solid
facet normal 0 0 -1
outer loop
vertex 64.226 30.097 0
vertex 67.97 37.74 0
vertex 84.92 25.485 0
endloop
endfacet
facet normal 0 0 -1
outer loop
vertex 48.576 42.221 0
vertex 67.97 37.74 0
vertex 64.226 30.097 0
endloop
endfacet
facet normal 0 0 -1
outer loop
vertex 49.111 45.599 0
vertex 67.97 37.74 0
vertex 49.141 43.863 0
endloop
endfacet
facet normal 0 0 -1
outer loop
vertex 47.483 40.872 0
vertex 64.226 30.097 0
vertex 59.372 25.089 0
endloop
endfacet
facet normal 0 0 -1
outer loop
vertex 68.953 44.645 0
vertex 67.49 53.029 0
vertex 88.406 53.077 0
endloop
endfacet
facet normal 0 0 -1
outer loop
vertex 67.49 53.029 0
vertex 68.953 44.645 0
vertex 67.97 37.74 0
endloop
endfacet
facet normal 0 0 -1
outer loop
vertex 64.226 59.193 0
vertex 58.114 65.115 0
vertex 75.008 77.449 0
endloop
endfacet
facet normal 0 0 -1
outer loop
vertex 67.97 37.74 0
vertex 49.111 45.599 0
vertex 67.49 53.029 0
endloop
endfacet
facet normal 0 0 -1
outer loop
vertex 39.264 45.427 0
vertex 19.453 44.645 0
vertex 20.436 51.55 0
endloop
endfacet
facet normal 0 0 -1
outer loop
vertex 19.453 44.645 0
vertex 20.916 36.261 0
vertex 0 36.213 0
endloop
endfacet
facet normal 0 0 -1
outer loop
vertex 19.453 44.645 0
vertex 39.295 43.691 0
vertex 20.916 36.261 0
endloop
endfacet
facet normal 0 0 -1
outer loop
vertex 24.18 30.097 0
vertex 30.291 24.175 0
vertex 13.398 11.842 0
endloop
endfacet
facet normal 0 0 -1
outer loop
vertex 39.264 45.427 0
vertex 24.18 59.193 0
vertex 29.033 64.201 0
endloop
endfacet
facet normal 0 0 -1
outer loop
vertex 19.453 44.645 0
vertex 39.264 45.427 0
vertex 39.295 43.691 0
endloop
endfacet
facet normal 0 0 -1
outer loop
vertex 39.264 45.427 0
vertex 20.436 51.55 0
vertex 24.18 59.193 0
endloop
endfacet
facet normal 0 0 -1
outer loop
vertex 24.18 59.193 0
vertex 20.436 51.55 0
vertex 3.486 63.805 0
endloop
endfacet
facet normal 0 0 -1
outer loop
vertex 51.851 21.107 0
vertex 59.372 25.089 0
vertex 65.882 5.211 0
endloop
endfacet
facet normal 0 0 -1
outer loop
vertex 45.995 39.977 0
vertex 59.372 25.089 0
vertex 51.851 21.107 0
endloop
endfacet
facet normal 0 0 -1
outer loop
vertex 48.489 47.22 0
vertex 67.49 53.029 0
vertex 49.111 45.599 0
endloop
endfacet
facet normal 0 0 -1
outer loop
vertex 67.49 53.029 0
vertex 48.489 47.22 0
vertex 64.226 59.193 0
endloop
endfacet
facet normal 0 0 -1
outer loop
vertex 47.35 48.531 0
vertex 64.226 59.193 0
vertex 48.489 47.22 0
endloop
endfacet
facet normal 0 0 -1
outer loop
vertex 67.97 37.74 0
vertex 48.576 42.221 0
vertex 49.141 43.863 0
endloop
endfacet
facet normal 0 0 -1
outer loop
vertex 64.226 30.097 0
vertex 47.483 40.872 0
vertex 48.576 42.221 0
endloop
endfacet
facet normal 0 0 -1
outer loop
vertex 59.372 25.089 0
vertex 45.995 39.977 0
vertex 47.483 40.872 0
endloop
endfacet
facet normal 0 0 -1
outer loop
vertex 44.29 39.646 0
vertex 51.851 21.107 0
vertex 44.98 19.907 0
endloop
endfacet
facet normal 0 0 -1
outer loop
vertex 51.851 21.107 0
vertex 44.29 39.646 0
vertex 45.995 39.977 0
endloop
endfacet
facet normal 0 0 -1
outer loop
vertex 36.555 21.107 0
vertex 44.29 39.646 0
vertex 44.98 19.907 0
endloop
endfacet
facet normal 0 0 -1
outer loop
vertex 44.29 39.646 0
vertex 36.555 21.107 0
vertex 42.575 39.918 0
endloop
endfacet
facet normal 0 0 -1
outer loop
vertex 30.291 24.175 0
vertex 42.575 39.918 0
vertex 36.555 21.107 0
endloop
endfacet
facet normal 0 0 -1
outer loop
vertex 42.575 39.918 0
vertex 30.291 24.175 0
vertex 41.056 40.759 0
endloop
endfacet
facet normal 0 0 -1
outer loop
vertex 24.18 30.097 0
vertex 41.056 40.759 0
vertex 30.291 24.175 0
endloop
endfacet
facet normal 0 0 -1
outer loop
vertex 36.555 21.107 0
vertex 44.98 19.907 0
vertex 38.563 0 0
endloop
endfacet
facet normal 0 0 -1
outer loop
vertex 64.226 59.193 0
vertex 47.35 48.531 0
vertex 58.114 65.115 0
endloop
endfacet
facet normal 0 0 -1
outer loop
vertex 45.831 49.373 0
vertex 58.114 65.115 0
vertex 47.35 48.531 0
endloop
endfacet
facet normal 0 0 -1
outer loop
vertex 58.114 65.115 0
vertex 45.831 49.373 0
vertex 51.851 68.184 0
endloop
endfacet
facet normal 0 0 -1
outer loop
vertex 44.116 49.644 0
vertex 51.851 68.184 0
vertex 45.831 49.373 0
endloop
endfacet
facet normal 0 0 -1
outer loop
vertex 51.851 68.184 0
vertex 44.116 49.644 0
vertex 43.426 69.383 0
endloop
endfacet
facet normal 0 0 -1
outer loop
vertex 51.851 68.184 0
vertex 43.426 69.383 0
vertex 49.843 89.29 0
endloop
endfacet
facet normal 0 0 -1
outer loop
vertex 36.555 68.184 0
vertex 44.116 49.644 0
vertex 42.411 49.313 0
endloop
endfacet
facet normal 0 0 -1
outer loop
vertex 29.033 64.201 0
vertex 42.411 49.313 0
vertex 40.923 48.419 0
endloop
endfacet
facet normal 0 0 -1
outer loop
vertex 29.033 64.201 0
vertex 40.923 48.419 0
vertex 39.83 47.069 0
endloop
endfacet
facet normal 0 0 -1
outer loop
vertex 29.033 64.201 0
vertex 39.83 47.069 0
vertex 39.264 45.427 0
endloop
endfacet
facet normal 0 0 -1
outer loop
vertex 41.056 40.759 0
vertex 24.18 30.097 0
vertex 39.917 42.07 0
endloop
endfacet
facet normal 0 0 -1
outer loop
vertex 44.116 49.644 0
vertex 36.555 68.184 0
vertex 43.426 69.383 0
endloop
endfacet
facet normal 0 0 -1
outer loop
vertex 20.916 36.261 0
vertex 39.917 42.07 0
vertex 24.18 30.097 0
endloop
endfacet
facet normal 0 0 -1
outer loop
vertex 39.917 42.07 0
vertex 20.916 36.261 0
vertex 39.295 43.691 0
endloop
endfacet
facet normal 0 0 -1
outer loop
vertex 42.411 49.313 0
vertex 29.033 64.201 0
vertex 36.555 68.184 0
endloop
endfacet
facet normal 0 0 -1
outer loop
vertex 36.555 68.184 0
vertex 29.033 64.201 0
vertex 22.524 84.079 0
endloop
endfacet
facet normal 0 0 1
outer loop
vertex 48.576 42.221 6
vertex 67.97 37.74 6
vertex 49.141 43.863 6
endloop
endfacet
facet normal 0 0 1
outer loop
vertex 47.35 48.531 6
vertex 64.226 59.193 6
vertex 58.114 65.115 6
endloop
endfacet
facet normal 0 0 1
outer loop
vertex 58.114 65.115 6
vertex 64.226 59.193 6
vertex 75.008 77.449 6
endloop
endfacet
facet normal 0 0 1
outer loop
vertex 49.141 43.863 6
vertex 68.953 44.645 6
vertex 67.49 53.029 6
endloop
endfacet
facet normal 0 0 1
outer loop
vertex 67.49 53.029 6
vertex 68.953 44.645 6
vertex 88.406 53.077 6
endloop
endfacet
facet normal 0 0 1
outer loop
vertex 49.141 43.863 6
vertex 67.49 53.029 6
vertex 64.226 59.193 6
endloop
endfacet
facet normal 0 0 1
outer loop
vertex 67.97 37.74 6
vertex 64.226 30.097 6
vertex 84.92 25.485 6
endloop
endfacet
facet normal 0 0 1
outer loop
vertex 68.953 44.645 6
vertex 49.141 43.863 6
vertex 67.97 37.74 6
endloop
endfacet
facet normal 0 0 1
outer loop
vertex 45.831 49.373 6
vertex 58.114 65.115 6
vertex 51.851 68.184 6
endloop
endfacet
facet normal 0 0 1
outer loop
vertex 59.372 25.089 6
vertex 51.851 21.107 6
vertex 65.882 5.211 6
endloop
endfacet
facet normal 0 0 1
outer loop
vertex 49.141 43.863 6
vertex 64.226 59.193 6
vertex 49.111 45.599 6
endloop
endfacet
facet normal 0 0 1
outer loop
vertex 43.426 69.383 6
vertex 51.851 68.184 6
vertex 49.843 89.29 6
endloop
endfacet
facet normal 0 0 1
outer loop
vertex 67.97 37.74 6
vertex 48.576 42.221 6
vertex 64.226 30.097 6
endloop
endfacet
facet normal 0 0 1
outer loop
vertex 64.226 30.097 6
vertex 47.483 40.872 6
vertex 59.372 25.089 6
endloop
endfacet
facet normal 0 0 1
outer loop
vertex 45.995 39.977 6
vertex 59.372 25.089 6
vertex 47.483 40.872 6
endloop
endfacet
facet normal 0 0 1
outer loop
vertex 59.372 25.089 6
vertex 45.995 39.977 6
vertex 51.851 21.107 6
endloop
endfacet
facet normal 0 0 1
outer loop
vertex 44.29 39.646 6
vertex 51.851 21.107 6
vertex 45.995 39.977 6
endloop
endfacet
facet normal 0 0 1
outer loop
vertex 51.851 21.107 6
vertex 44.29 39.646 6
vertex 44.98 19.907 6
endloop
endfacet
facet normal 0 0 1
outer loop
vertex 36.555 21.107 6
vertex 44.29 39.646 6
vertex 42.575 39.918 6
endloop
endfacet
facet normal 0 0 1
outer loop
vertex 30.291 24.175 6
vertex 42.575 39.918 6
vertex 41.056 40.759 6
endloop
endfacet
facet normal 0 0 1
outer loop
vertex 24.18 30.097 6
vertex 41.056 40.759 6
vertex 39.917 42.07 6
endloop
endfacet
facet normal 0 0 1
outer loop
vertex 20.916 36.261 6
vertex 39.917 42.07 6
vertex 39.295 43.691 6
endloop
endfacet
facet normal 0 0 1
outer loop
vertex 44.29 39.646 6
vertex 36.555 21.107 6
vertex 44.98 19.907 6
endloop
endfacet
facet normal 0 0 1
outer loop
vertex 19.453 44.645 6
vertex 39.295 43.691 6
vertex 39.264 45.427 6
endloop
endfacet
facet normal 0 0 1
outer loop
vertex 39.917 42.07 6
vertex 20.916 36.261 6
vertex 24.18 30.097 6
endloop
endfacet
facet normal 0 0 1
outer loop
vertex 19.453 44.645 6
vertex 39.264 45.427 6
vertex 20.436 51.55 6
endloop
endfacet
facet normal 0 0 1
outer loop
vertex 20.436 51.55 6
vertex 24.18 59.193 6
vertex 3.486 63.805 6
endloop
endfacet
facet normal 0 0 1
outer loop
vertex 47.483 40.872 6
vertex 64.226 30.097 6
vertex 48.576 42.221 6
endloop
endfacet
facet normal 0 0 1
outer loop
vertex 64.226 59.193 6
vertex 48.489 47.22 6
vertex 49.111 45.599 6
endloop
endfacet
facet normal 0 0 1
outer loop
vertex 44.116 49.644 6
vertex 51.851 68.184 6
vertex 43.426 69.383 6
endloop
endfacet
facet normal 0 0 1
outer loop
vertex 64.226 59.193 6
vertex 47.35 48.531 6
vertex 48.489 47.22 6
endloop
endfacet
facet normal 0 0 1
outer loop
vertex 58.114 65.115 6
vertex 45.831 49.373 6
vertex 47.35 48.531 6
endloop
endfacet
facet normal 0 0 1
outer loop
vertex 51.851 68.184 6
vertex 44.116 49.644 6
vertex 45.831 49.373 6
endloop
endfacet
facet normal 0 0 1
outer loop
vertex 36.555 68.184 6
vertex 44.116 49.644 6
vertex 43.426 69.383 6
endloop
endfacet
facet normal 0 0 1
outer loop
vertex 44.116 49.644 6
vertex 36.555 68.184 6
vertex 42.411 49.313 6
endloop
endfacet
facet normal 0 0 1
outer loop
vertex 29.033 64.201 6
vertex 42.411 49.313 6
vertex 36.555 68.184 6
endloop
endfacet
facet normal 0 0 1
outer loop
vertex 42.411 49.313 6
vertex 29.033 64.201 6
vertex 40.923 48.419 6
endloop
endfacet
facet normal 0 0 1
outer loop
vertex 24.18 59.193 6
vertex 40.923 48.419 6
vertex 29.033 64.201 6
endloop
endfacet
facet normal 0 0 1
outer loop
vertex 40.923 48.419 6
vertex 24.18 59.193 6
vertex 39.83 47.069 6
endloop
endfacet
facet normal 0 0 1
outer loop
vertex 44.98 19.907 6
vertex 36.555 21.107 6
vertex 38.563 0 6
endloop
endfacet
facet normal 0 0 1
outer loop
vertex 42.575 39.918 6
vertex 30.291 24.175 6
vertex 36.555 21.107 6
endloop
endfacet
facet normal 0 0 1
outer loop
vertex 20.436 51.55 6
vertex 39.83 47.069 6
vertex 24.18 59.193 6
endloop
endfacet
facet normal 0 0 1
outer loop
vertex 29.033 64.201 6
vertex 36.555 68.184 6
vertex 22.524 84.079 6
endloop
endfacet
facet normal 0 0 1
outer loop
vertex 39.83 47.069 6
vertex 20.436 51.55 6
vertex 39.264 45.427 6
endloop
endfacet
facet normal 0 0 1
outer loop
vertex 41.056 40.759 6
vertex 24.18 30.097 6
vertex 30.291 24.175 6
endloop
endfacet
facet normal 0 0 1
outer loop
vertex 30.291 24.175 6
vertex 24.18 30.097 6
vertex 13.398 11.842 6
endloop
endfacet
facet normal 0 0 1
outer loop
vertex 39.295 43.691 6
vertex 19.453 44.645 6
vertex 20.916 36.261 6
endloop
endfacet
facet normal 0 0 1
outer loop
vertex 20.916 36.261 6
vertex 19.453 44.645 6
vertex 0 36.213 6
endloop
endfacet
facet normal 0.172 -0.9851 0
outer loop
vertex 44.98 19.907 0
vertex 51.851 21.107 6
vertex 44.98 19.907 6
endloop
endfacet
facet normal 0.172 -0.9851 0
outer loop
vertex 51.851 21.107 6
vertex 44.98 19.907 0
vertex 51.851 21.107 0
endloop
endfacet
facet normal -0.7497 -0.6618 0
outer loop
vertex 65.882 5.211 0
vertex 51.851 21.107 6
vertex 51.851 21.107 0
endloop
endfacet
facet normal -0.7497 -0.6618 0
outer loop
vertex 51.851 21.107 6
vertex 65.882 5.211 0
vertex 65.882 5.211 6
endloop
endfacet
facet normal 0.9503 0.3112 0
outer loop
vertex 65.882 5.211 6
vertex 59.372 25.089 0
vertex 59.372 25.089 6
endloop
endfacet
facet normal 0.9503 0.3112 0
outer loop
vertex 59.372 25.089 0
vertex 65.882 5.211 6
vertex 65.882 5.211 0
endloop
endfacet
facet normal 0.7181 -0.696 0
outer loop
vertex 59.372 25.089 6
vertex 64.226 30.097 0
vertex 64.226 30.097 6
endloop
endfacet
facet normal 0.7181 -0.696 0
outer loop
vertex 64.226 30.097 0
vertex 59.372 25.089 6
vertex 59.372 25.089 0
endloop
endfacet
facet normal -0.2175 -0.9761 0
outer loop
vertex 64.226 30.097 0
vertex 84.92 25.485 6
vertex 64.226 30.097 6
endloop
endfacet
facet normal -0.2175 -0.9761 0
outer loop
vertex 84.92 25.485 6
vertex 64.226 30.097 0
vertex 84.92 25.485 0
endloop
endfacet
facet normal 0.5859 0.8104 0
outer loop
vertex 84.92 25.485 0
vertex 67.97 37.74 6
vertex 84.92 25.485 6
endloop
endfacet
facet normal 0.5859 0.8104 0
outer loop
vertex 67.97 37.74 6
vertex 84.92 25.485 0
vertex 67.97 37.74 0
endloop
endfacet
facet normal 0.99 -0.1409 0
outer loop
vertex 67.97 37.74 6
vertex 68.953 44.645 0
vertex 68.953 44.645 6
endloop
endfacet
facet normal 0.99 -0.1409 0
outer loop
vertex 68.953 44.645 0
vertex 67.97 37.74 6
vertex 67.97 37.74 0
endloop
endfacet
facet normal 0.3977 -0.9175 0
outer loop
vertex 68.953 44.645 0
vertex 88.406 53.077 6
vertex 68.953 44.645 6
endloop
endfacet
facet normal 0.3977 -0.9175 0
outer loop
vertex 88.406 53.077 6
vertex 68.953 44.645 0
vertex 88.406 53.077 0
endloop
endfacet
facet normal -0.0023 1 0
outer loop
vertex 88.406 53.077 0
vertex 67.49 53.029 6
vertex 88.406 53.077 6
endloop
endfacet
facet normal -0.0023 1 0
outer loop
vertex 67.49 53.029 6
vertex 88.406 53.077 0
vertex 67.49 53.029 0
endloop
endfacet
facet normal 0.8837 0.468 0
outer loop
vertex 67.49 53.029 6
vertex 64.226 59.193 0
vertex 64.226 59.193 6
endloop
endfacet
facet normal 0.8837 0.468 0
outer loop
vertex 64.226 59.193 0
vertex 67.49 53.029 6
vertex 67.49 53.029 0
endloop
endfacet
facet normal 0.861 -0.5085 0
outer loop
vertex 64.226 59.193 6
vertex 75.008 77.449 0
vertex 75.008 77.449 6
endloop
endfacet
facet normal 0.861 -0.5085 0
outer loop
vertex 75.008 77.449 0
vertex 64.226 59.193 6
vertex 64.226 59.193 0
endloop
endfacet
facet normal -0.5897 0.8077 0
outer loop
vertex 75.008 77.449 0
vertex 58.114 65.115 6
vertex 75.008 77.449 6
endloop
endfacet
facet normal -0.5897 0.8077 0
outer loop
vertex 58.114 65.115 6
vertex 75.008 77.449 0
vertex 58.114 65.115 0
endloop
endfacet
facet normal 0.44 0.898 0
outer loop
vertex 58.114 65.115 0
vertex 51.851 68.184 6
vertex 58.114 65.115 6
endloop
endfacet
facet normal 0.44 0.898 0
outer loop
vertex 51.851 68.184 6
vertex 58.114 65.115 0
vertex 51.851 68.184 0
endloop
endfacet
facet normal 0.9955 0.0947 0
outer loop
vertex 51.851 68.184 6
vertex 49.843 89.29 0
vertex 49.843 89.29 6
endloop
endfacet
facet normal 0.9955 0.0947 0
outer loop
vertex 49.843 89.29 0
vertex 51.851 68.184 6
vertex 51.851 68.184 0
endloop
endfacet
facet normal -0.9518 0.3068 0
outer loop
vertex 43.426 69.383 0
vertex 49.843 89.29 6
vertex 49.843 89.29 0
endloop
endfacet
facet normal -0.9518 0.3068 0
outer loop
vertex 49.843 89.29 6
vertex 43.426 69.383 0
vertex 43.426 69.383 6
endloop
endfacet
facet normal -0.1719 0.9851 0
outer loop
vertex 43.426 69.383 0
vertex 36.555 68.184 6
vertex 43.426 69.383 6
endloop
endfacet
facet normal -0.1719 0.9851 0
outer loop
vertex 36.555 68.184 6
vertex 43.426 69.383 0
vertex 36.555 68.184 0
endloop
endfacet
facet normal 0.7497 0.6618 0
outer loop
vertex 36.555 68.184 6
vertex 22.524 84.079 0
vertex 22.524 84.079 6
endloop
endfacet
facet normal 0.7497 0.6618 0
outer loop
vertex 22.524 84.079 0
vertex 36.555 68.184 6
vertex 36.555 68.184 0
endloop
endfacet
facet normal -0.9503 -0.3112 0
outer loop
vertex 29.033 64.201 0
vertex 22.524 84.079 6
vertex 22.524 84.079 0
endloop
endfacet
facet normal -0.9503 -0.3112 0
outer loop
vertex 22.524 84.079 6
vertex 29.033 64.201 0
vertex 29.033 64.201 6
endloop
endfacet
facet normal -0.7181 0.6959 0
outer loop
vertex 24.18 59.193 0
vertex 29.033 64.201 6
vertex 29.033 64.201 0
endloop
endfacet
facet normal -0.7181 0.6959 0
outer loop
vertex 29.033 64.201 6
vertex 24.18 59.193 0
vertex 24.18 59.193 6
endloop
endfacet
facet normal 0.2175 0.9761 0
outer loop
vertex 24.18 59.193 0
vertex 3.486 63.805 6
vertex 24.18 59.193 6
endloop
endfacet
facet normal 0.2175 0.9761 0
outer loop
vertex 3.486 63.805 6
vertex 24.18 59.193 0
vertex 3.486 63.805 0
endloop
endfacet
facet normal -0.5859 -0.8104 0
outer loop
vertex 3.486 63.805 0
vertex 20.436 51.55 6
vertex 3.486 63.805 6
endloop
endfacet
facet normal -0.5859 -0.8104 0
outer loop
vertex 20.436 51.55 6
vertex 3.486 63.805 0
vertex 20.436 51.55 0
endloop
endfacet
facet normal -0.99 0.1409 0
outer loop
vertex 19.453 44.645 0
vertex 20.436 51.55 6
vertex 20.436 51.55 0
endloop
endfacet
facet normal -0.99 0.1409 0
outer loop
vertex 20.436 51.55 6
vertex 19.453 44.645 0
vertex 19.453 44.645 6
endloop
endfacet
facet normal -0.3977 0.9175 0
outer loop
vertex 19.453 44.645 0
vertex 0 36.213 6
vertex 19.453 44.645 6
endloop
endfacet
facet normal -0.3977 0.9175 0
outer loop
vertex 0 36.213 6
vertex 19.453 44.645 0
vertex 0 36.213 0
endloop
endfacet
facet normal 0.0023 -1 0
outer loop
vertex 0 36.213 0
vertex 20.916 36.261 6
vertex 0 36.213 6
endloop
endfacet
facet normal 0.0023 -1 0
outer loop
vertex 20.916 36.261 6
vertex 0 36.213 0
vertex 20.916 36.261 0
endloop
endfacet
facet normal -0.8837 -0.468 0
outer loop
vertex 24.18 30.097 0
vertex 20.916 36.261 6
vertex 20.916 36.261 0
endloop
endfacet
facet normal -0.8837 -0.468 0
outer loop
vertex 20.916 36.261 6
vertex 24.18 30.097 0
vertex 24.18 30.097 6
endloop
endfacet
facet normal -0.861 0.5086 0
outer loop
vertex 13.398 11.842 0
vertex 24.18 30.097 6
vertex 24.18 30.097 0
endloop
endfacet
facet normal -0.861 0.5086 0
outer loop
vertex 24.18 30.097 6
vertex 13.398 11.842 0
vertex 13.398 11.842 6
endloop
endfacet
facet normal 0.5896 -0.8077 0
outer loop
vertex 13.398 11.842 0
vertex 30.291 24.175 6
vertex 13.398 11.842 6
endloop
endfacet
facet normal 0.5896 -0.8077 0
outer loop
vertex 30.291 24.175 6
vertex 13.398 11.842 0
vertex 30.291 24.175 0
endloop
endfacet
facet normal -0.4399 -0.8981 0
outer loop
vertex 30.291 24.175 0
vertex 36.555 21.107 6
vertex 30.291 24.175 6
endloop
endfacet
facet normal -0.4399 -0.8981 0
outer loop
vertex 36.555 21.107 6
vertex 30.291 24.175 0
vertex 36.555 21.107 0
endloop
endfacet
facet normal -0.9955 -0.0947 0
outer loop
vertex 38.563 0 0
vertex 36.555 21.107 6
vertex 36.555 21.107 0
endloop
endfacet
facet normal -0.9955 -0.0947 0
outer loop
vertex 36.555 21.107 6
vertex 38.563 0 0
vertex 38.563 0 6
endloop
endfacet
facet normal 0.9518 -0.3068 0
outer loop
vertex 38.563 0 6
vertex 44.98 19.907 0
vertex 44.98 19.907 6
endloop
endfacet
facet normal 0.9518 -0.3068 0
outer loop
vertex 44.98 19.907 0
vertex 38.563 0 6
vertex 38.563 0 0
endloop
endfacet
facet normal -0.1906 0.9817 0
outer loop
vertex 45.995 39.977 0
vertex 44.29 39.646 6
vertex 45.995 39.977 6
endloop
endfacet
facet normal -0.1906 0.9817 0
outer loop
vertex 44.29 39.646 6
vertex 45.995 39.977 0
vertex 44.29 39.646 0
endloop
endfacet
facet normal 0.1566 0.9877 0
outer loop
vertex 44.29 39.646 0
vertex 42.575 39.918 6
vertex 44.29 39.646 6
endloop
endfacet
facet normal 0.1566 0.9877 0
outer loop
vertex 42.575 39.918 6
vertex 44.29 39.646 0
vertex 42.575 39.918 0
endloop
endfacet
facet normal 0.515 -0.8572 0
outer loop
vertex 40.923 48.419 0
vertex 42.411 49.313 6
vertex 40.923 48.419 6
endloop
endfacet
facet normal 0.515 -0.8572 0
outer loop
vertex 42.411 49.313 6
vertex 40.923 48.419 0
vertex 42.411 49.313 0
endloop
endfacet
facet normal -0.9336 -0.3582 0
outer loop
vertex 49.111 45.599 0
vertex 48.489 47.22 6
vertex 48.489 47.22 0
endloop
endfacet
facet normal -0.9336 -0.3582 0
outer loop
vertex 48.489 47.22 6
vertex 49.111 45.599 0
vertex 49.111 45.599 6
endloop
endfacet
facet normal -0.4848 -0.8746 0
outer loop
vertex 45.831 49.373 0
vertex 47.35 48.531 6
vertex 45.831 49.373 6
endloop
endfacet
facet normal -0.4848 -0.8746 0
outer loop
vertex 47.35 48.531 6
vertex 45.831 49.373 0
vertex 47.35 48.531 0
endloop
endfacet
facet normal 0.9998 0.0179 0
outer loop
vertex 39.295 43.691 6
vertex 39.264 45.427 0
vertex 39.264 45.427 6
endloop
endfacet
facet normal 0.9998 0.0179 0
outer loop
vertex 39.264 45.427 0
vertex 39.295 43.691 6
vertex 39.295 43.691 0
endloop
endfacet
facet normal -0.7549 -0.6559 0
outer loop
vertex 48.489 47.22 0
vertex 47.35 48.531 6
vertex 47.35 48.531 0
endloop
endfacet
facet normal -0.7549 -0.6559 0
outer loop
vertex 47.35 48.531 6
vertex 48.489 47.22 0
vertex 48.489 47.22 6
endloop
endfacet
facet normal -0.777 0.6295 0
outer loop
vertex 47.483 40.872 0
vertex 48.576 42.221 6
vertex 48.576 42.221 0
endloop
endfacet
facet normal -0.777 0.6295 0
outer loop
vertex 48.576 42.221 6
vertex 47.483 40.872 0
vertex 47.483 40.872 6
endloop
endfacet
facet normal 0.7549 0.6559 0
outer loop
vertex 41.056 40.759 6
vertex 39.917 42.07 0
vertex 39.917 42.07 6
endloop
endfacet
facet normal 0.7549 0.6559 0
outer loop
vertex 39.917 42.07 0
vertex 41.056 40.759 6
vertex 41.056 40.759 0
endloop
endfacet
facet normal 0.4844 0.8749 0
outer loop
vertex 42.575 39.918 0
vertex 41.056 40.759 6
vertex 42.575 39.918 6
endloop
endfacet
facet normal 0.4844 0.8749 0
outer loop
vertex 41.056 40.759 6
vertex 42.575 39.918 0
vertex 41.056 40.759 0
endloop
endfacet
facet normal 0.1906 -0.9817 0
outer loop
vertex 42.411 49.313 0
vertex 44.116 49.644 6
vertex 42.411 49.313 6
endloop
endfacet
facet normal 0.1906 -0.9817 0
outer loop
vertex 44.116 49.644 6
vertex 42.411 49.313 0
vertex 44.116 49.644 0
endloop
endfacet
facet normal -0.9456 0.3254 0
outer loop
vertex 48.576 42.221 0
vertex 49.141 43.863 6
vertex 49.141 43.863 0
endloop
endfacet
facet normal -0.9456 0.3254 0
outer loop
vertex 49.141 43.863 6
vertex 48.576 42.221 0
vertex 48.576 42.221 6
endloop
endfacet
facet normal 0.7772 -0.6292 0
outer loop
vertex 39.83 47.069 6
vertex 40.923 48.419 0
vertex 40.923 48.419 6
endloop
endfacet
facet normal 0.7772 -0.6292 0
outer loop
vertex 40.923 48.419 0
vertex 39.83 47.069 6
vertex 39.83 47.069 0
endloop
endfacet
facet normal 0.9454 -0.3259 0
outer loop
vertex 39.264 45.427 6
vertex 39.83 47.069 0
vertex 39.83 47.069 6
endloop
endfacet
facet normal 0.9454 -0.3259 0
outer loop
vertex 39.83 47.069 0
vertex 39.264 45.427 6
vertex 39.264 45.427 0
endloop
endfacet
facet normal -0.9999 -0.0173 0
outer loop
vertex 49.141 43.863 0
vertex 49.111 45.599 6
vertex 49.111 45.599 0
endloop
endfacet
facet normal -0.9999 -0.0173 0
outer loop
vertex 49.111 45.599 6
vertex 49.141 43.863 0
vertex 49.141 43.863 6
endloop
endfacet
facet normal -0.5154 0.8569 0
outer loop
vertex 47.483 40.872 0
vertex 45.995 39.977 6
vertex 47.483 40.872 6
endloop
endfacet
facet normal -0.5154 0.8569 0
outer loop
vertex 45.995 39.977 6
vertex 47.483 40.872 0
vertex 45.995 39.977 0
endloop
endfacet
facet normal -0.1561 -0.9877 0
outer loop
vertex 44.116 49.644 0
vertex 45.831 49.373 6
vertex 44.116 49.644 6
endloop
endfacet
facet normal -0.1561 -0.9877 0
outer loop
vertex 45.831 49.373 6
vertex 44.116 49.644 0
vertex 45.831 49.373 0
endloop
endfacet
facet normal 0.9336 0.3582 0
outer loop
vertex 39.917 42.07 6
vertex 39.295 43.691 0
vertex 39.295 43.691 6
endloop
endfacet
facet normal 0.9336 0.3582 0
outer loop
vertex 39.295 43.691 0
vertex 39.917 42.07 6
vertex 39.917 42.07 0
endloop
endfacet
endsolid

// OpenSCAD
$fn = 32;

// ----------------------------------------------------------------------
// Star wheel: 10-point ratchet, R45
// ----------------------------------------------------------------------

// --- parameters (mm) ---
n_points = 10;            // number of points / teeth
r_out = 45;               // tip radius
r_in = 24.75;             // root radius
bore_r = 5;               // centre bore radius
plate_t = 6;              // plate thickness, Z (extrusion height)
bore_d = 10;              // centre bore diameter
fit_tol = 0.02;           // declared fit tolerance (prompt contract)
free_tol = 0.2;           // declared free tolerance (prompt contract)

profile = [[19.453, 44.645], [0, 36.213], [20.916, 36.261], [24.18, 30.097], [13.398, 11.842], [30.291, 24.175], [36.555, 21.107], [38.563, 0], [44.98, 19.907], [51.851, 21.107], [65.882, 5.211], [59.372, 25.089], [64.226, 30.097], [84.92, 25.485], [67.97, 37.74], [68.953, 44.645], [88.406, 53.077], [67.49, 53.029], [64.226, 59.193], [75.008, 77.449], [58.114, 65.115], [51.851, 68.184], [49.843, 89.29], [43.426, 69.383], [36.555, 68.184], [22.524, 84.079], [29.033, 64.201], [24.18, 59.193], [3.486, 63.805], [20.436, 51.55]];  // primary outline, 30 points, counter clockwise
void_1 = [[49.111, 45.599], [48.489, 47.22], [47.35, 48.531], [45.831, 49.373], [44.116, 49.644], [42.411, 49.313], [40.923, 48.419], [39.83, 47.069], [39.264, 45.427], [39.295, 43.691], [39.917, 42.07], [41.056, 40.759], [42.575, 39.918], [44.29, 39.646], [45.995, 39.977], [47.483, 40.872], [48.576, 42.221], [49.141, 43.863]];  // centre bore, 18 points

// --- the one profile operation ---
difference() {
  linear_extrude(height = plate_t) polygon(points = profile);
  translate([0, 0, -1])
    linear_extrude(height = plate_t + 2) polygon(points = void_1);
}
